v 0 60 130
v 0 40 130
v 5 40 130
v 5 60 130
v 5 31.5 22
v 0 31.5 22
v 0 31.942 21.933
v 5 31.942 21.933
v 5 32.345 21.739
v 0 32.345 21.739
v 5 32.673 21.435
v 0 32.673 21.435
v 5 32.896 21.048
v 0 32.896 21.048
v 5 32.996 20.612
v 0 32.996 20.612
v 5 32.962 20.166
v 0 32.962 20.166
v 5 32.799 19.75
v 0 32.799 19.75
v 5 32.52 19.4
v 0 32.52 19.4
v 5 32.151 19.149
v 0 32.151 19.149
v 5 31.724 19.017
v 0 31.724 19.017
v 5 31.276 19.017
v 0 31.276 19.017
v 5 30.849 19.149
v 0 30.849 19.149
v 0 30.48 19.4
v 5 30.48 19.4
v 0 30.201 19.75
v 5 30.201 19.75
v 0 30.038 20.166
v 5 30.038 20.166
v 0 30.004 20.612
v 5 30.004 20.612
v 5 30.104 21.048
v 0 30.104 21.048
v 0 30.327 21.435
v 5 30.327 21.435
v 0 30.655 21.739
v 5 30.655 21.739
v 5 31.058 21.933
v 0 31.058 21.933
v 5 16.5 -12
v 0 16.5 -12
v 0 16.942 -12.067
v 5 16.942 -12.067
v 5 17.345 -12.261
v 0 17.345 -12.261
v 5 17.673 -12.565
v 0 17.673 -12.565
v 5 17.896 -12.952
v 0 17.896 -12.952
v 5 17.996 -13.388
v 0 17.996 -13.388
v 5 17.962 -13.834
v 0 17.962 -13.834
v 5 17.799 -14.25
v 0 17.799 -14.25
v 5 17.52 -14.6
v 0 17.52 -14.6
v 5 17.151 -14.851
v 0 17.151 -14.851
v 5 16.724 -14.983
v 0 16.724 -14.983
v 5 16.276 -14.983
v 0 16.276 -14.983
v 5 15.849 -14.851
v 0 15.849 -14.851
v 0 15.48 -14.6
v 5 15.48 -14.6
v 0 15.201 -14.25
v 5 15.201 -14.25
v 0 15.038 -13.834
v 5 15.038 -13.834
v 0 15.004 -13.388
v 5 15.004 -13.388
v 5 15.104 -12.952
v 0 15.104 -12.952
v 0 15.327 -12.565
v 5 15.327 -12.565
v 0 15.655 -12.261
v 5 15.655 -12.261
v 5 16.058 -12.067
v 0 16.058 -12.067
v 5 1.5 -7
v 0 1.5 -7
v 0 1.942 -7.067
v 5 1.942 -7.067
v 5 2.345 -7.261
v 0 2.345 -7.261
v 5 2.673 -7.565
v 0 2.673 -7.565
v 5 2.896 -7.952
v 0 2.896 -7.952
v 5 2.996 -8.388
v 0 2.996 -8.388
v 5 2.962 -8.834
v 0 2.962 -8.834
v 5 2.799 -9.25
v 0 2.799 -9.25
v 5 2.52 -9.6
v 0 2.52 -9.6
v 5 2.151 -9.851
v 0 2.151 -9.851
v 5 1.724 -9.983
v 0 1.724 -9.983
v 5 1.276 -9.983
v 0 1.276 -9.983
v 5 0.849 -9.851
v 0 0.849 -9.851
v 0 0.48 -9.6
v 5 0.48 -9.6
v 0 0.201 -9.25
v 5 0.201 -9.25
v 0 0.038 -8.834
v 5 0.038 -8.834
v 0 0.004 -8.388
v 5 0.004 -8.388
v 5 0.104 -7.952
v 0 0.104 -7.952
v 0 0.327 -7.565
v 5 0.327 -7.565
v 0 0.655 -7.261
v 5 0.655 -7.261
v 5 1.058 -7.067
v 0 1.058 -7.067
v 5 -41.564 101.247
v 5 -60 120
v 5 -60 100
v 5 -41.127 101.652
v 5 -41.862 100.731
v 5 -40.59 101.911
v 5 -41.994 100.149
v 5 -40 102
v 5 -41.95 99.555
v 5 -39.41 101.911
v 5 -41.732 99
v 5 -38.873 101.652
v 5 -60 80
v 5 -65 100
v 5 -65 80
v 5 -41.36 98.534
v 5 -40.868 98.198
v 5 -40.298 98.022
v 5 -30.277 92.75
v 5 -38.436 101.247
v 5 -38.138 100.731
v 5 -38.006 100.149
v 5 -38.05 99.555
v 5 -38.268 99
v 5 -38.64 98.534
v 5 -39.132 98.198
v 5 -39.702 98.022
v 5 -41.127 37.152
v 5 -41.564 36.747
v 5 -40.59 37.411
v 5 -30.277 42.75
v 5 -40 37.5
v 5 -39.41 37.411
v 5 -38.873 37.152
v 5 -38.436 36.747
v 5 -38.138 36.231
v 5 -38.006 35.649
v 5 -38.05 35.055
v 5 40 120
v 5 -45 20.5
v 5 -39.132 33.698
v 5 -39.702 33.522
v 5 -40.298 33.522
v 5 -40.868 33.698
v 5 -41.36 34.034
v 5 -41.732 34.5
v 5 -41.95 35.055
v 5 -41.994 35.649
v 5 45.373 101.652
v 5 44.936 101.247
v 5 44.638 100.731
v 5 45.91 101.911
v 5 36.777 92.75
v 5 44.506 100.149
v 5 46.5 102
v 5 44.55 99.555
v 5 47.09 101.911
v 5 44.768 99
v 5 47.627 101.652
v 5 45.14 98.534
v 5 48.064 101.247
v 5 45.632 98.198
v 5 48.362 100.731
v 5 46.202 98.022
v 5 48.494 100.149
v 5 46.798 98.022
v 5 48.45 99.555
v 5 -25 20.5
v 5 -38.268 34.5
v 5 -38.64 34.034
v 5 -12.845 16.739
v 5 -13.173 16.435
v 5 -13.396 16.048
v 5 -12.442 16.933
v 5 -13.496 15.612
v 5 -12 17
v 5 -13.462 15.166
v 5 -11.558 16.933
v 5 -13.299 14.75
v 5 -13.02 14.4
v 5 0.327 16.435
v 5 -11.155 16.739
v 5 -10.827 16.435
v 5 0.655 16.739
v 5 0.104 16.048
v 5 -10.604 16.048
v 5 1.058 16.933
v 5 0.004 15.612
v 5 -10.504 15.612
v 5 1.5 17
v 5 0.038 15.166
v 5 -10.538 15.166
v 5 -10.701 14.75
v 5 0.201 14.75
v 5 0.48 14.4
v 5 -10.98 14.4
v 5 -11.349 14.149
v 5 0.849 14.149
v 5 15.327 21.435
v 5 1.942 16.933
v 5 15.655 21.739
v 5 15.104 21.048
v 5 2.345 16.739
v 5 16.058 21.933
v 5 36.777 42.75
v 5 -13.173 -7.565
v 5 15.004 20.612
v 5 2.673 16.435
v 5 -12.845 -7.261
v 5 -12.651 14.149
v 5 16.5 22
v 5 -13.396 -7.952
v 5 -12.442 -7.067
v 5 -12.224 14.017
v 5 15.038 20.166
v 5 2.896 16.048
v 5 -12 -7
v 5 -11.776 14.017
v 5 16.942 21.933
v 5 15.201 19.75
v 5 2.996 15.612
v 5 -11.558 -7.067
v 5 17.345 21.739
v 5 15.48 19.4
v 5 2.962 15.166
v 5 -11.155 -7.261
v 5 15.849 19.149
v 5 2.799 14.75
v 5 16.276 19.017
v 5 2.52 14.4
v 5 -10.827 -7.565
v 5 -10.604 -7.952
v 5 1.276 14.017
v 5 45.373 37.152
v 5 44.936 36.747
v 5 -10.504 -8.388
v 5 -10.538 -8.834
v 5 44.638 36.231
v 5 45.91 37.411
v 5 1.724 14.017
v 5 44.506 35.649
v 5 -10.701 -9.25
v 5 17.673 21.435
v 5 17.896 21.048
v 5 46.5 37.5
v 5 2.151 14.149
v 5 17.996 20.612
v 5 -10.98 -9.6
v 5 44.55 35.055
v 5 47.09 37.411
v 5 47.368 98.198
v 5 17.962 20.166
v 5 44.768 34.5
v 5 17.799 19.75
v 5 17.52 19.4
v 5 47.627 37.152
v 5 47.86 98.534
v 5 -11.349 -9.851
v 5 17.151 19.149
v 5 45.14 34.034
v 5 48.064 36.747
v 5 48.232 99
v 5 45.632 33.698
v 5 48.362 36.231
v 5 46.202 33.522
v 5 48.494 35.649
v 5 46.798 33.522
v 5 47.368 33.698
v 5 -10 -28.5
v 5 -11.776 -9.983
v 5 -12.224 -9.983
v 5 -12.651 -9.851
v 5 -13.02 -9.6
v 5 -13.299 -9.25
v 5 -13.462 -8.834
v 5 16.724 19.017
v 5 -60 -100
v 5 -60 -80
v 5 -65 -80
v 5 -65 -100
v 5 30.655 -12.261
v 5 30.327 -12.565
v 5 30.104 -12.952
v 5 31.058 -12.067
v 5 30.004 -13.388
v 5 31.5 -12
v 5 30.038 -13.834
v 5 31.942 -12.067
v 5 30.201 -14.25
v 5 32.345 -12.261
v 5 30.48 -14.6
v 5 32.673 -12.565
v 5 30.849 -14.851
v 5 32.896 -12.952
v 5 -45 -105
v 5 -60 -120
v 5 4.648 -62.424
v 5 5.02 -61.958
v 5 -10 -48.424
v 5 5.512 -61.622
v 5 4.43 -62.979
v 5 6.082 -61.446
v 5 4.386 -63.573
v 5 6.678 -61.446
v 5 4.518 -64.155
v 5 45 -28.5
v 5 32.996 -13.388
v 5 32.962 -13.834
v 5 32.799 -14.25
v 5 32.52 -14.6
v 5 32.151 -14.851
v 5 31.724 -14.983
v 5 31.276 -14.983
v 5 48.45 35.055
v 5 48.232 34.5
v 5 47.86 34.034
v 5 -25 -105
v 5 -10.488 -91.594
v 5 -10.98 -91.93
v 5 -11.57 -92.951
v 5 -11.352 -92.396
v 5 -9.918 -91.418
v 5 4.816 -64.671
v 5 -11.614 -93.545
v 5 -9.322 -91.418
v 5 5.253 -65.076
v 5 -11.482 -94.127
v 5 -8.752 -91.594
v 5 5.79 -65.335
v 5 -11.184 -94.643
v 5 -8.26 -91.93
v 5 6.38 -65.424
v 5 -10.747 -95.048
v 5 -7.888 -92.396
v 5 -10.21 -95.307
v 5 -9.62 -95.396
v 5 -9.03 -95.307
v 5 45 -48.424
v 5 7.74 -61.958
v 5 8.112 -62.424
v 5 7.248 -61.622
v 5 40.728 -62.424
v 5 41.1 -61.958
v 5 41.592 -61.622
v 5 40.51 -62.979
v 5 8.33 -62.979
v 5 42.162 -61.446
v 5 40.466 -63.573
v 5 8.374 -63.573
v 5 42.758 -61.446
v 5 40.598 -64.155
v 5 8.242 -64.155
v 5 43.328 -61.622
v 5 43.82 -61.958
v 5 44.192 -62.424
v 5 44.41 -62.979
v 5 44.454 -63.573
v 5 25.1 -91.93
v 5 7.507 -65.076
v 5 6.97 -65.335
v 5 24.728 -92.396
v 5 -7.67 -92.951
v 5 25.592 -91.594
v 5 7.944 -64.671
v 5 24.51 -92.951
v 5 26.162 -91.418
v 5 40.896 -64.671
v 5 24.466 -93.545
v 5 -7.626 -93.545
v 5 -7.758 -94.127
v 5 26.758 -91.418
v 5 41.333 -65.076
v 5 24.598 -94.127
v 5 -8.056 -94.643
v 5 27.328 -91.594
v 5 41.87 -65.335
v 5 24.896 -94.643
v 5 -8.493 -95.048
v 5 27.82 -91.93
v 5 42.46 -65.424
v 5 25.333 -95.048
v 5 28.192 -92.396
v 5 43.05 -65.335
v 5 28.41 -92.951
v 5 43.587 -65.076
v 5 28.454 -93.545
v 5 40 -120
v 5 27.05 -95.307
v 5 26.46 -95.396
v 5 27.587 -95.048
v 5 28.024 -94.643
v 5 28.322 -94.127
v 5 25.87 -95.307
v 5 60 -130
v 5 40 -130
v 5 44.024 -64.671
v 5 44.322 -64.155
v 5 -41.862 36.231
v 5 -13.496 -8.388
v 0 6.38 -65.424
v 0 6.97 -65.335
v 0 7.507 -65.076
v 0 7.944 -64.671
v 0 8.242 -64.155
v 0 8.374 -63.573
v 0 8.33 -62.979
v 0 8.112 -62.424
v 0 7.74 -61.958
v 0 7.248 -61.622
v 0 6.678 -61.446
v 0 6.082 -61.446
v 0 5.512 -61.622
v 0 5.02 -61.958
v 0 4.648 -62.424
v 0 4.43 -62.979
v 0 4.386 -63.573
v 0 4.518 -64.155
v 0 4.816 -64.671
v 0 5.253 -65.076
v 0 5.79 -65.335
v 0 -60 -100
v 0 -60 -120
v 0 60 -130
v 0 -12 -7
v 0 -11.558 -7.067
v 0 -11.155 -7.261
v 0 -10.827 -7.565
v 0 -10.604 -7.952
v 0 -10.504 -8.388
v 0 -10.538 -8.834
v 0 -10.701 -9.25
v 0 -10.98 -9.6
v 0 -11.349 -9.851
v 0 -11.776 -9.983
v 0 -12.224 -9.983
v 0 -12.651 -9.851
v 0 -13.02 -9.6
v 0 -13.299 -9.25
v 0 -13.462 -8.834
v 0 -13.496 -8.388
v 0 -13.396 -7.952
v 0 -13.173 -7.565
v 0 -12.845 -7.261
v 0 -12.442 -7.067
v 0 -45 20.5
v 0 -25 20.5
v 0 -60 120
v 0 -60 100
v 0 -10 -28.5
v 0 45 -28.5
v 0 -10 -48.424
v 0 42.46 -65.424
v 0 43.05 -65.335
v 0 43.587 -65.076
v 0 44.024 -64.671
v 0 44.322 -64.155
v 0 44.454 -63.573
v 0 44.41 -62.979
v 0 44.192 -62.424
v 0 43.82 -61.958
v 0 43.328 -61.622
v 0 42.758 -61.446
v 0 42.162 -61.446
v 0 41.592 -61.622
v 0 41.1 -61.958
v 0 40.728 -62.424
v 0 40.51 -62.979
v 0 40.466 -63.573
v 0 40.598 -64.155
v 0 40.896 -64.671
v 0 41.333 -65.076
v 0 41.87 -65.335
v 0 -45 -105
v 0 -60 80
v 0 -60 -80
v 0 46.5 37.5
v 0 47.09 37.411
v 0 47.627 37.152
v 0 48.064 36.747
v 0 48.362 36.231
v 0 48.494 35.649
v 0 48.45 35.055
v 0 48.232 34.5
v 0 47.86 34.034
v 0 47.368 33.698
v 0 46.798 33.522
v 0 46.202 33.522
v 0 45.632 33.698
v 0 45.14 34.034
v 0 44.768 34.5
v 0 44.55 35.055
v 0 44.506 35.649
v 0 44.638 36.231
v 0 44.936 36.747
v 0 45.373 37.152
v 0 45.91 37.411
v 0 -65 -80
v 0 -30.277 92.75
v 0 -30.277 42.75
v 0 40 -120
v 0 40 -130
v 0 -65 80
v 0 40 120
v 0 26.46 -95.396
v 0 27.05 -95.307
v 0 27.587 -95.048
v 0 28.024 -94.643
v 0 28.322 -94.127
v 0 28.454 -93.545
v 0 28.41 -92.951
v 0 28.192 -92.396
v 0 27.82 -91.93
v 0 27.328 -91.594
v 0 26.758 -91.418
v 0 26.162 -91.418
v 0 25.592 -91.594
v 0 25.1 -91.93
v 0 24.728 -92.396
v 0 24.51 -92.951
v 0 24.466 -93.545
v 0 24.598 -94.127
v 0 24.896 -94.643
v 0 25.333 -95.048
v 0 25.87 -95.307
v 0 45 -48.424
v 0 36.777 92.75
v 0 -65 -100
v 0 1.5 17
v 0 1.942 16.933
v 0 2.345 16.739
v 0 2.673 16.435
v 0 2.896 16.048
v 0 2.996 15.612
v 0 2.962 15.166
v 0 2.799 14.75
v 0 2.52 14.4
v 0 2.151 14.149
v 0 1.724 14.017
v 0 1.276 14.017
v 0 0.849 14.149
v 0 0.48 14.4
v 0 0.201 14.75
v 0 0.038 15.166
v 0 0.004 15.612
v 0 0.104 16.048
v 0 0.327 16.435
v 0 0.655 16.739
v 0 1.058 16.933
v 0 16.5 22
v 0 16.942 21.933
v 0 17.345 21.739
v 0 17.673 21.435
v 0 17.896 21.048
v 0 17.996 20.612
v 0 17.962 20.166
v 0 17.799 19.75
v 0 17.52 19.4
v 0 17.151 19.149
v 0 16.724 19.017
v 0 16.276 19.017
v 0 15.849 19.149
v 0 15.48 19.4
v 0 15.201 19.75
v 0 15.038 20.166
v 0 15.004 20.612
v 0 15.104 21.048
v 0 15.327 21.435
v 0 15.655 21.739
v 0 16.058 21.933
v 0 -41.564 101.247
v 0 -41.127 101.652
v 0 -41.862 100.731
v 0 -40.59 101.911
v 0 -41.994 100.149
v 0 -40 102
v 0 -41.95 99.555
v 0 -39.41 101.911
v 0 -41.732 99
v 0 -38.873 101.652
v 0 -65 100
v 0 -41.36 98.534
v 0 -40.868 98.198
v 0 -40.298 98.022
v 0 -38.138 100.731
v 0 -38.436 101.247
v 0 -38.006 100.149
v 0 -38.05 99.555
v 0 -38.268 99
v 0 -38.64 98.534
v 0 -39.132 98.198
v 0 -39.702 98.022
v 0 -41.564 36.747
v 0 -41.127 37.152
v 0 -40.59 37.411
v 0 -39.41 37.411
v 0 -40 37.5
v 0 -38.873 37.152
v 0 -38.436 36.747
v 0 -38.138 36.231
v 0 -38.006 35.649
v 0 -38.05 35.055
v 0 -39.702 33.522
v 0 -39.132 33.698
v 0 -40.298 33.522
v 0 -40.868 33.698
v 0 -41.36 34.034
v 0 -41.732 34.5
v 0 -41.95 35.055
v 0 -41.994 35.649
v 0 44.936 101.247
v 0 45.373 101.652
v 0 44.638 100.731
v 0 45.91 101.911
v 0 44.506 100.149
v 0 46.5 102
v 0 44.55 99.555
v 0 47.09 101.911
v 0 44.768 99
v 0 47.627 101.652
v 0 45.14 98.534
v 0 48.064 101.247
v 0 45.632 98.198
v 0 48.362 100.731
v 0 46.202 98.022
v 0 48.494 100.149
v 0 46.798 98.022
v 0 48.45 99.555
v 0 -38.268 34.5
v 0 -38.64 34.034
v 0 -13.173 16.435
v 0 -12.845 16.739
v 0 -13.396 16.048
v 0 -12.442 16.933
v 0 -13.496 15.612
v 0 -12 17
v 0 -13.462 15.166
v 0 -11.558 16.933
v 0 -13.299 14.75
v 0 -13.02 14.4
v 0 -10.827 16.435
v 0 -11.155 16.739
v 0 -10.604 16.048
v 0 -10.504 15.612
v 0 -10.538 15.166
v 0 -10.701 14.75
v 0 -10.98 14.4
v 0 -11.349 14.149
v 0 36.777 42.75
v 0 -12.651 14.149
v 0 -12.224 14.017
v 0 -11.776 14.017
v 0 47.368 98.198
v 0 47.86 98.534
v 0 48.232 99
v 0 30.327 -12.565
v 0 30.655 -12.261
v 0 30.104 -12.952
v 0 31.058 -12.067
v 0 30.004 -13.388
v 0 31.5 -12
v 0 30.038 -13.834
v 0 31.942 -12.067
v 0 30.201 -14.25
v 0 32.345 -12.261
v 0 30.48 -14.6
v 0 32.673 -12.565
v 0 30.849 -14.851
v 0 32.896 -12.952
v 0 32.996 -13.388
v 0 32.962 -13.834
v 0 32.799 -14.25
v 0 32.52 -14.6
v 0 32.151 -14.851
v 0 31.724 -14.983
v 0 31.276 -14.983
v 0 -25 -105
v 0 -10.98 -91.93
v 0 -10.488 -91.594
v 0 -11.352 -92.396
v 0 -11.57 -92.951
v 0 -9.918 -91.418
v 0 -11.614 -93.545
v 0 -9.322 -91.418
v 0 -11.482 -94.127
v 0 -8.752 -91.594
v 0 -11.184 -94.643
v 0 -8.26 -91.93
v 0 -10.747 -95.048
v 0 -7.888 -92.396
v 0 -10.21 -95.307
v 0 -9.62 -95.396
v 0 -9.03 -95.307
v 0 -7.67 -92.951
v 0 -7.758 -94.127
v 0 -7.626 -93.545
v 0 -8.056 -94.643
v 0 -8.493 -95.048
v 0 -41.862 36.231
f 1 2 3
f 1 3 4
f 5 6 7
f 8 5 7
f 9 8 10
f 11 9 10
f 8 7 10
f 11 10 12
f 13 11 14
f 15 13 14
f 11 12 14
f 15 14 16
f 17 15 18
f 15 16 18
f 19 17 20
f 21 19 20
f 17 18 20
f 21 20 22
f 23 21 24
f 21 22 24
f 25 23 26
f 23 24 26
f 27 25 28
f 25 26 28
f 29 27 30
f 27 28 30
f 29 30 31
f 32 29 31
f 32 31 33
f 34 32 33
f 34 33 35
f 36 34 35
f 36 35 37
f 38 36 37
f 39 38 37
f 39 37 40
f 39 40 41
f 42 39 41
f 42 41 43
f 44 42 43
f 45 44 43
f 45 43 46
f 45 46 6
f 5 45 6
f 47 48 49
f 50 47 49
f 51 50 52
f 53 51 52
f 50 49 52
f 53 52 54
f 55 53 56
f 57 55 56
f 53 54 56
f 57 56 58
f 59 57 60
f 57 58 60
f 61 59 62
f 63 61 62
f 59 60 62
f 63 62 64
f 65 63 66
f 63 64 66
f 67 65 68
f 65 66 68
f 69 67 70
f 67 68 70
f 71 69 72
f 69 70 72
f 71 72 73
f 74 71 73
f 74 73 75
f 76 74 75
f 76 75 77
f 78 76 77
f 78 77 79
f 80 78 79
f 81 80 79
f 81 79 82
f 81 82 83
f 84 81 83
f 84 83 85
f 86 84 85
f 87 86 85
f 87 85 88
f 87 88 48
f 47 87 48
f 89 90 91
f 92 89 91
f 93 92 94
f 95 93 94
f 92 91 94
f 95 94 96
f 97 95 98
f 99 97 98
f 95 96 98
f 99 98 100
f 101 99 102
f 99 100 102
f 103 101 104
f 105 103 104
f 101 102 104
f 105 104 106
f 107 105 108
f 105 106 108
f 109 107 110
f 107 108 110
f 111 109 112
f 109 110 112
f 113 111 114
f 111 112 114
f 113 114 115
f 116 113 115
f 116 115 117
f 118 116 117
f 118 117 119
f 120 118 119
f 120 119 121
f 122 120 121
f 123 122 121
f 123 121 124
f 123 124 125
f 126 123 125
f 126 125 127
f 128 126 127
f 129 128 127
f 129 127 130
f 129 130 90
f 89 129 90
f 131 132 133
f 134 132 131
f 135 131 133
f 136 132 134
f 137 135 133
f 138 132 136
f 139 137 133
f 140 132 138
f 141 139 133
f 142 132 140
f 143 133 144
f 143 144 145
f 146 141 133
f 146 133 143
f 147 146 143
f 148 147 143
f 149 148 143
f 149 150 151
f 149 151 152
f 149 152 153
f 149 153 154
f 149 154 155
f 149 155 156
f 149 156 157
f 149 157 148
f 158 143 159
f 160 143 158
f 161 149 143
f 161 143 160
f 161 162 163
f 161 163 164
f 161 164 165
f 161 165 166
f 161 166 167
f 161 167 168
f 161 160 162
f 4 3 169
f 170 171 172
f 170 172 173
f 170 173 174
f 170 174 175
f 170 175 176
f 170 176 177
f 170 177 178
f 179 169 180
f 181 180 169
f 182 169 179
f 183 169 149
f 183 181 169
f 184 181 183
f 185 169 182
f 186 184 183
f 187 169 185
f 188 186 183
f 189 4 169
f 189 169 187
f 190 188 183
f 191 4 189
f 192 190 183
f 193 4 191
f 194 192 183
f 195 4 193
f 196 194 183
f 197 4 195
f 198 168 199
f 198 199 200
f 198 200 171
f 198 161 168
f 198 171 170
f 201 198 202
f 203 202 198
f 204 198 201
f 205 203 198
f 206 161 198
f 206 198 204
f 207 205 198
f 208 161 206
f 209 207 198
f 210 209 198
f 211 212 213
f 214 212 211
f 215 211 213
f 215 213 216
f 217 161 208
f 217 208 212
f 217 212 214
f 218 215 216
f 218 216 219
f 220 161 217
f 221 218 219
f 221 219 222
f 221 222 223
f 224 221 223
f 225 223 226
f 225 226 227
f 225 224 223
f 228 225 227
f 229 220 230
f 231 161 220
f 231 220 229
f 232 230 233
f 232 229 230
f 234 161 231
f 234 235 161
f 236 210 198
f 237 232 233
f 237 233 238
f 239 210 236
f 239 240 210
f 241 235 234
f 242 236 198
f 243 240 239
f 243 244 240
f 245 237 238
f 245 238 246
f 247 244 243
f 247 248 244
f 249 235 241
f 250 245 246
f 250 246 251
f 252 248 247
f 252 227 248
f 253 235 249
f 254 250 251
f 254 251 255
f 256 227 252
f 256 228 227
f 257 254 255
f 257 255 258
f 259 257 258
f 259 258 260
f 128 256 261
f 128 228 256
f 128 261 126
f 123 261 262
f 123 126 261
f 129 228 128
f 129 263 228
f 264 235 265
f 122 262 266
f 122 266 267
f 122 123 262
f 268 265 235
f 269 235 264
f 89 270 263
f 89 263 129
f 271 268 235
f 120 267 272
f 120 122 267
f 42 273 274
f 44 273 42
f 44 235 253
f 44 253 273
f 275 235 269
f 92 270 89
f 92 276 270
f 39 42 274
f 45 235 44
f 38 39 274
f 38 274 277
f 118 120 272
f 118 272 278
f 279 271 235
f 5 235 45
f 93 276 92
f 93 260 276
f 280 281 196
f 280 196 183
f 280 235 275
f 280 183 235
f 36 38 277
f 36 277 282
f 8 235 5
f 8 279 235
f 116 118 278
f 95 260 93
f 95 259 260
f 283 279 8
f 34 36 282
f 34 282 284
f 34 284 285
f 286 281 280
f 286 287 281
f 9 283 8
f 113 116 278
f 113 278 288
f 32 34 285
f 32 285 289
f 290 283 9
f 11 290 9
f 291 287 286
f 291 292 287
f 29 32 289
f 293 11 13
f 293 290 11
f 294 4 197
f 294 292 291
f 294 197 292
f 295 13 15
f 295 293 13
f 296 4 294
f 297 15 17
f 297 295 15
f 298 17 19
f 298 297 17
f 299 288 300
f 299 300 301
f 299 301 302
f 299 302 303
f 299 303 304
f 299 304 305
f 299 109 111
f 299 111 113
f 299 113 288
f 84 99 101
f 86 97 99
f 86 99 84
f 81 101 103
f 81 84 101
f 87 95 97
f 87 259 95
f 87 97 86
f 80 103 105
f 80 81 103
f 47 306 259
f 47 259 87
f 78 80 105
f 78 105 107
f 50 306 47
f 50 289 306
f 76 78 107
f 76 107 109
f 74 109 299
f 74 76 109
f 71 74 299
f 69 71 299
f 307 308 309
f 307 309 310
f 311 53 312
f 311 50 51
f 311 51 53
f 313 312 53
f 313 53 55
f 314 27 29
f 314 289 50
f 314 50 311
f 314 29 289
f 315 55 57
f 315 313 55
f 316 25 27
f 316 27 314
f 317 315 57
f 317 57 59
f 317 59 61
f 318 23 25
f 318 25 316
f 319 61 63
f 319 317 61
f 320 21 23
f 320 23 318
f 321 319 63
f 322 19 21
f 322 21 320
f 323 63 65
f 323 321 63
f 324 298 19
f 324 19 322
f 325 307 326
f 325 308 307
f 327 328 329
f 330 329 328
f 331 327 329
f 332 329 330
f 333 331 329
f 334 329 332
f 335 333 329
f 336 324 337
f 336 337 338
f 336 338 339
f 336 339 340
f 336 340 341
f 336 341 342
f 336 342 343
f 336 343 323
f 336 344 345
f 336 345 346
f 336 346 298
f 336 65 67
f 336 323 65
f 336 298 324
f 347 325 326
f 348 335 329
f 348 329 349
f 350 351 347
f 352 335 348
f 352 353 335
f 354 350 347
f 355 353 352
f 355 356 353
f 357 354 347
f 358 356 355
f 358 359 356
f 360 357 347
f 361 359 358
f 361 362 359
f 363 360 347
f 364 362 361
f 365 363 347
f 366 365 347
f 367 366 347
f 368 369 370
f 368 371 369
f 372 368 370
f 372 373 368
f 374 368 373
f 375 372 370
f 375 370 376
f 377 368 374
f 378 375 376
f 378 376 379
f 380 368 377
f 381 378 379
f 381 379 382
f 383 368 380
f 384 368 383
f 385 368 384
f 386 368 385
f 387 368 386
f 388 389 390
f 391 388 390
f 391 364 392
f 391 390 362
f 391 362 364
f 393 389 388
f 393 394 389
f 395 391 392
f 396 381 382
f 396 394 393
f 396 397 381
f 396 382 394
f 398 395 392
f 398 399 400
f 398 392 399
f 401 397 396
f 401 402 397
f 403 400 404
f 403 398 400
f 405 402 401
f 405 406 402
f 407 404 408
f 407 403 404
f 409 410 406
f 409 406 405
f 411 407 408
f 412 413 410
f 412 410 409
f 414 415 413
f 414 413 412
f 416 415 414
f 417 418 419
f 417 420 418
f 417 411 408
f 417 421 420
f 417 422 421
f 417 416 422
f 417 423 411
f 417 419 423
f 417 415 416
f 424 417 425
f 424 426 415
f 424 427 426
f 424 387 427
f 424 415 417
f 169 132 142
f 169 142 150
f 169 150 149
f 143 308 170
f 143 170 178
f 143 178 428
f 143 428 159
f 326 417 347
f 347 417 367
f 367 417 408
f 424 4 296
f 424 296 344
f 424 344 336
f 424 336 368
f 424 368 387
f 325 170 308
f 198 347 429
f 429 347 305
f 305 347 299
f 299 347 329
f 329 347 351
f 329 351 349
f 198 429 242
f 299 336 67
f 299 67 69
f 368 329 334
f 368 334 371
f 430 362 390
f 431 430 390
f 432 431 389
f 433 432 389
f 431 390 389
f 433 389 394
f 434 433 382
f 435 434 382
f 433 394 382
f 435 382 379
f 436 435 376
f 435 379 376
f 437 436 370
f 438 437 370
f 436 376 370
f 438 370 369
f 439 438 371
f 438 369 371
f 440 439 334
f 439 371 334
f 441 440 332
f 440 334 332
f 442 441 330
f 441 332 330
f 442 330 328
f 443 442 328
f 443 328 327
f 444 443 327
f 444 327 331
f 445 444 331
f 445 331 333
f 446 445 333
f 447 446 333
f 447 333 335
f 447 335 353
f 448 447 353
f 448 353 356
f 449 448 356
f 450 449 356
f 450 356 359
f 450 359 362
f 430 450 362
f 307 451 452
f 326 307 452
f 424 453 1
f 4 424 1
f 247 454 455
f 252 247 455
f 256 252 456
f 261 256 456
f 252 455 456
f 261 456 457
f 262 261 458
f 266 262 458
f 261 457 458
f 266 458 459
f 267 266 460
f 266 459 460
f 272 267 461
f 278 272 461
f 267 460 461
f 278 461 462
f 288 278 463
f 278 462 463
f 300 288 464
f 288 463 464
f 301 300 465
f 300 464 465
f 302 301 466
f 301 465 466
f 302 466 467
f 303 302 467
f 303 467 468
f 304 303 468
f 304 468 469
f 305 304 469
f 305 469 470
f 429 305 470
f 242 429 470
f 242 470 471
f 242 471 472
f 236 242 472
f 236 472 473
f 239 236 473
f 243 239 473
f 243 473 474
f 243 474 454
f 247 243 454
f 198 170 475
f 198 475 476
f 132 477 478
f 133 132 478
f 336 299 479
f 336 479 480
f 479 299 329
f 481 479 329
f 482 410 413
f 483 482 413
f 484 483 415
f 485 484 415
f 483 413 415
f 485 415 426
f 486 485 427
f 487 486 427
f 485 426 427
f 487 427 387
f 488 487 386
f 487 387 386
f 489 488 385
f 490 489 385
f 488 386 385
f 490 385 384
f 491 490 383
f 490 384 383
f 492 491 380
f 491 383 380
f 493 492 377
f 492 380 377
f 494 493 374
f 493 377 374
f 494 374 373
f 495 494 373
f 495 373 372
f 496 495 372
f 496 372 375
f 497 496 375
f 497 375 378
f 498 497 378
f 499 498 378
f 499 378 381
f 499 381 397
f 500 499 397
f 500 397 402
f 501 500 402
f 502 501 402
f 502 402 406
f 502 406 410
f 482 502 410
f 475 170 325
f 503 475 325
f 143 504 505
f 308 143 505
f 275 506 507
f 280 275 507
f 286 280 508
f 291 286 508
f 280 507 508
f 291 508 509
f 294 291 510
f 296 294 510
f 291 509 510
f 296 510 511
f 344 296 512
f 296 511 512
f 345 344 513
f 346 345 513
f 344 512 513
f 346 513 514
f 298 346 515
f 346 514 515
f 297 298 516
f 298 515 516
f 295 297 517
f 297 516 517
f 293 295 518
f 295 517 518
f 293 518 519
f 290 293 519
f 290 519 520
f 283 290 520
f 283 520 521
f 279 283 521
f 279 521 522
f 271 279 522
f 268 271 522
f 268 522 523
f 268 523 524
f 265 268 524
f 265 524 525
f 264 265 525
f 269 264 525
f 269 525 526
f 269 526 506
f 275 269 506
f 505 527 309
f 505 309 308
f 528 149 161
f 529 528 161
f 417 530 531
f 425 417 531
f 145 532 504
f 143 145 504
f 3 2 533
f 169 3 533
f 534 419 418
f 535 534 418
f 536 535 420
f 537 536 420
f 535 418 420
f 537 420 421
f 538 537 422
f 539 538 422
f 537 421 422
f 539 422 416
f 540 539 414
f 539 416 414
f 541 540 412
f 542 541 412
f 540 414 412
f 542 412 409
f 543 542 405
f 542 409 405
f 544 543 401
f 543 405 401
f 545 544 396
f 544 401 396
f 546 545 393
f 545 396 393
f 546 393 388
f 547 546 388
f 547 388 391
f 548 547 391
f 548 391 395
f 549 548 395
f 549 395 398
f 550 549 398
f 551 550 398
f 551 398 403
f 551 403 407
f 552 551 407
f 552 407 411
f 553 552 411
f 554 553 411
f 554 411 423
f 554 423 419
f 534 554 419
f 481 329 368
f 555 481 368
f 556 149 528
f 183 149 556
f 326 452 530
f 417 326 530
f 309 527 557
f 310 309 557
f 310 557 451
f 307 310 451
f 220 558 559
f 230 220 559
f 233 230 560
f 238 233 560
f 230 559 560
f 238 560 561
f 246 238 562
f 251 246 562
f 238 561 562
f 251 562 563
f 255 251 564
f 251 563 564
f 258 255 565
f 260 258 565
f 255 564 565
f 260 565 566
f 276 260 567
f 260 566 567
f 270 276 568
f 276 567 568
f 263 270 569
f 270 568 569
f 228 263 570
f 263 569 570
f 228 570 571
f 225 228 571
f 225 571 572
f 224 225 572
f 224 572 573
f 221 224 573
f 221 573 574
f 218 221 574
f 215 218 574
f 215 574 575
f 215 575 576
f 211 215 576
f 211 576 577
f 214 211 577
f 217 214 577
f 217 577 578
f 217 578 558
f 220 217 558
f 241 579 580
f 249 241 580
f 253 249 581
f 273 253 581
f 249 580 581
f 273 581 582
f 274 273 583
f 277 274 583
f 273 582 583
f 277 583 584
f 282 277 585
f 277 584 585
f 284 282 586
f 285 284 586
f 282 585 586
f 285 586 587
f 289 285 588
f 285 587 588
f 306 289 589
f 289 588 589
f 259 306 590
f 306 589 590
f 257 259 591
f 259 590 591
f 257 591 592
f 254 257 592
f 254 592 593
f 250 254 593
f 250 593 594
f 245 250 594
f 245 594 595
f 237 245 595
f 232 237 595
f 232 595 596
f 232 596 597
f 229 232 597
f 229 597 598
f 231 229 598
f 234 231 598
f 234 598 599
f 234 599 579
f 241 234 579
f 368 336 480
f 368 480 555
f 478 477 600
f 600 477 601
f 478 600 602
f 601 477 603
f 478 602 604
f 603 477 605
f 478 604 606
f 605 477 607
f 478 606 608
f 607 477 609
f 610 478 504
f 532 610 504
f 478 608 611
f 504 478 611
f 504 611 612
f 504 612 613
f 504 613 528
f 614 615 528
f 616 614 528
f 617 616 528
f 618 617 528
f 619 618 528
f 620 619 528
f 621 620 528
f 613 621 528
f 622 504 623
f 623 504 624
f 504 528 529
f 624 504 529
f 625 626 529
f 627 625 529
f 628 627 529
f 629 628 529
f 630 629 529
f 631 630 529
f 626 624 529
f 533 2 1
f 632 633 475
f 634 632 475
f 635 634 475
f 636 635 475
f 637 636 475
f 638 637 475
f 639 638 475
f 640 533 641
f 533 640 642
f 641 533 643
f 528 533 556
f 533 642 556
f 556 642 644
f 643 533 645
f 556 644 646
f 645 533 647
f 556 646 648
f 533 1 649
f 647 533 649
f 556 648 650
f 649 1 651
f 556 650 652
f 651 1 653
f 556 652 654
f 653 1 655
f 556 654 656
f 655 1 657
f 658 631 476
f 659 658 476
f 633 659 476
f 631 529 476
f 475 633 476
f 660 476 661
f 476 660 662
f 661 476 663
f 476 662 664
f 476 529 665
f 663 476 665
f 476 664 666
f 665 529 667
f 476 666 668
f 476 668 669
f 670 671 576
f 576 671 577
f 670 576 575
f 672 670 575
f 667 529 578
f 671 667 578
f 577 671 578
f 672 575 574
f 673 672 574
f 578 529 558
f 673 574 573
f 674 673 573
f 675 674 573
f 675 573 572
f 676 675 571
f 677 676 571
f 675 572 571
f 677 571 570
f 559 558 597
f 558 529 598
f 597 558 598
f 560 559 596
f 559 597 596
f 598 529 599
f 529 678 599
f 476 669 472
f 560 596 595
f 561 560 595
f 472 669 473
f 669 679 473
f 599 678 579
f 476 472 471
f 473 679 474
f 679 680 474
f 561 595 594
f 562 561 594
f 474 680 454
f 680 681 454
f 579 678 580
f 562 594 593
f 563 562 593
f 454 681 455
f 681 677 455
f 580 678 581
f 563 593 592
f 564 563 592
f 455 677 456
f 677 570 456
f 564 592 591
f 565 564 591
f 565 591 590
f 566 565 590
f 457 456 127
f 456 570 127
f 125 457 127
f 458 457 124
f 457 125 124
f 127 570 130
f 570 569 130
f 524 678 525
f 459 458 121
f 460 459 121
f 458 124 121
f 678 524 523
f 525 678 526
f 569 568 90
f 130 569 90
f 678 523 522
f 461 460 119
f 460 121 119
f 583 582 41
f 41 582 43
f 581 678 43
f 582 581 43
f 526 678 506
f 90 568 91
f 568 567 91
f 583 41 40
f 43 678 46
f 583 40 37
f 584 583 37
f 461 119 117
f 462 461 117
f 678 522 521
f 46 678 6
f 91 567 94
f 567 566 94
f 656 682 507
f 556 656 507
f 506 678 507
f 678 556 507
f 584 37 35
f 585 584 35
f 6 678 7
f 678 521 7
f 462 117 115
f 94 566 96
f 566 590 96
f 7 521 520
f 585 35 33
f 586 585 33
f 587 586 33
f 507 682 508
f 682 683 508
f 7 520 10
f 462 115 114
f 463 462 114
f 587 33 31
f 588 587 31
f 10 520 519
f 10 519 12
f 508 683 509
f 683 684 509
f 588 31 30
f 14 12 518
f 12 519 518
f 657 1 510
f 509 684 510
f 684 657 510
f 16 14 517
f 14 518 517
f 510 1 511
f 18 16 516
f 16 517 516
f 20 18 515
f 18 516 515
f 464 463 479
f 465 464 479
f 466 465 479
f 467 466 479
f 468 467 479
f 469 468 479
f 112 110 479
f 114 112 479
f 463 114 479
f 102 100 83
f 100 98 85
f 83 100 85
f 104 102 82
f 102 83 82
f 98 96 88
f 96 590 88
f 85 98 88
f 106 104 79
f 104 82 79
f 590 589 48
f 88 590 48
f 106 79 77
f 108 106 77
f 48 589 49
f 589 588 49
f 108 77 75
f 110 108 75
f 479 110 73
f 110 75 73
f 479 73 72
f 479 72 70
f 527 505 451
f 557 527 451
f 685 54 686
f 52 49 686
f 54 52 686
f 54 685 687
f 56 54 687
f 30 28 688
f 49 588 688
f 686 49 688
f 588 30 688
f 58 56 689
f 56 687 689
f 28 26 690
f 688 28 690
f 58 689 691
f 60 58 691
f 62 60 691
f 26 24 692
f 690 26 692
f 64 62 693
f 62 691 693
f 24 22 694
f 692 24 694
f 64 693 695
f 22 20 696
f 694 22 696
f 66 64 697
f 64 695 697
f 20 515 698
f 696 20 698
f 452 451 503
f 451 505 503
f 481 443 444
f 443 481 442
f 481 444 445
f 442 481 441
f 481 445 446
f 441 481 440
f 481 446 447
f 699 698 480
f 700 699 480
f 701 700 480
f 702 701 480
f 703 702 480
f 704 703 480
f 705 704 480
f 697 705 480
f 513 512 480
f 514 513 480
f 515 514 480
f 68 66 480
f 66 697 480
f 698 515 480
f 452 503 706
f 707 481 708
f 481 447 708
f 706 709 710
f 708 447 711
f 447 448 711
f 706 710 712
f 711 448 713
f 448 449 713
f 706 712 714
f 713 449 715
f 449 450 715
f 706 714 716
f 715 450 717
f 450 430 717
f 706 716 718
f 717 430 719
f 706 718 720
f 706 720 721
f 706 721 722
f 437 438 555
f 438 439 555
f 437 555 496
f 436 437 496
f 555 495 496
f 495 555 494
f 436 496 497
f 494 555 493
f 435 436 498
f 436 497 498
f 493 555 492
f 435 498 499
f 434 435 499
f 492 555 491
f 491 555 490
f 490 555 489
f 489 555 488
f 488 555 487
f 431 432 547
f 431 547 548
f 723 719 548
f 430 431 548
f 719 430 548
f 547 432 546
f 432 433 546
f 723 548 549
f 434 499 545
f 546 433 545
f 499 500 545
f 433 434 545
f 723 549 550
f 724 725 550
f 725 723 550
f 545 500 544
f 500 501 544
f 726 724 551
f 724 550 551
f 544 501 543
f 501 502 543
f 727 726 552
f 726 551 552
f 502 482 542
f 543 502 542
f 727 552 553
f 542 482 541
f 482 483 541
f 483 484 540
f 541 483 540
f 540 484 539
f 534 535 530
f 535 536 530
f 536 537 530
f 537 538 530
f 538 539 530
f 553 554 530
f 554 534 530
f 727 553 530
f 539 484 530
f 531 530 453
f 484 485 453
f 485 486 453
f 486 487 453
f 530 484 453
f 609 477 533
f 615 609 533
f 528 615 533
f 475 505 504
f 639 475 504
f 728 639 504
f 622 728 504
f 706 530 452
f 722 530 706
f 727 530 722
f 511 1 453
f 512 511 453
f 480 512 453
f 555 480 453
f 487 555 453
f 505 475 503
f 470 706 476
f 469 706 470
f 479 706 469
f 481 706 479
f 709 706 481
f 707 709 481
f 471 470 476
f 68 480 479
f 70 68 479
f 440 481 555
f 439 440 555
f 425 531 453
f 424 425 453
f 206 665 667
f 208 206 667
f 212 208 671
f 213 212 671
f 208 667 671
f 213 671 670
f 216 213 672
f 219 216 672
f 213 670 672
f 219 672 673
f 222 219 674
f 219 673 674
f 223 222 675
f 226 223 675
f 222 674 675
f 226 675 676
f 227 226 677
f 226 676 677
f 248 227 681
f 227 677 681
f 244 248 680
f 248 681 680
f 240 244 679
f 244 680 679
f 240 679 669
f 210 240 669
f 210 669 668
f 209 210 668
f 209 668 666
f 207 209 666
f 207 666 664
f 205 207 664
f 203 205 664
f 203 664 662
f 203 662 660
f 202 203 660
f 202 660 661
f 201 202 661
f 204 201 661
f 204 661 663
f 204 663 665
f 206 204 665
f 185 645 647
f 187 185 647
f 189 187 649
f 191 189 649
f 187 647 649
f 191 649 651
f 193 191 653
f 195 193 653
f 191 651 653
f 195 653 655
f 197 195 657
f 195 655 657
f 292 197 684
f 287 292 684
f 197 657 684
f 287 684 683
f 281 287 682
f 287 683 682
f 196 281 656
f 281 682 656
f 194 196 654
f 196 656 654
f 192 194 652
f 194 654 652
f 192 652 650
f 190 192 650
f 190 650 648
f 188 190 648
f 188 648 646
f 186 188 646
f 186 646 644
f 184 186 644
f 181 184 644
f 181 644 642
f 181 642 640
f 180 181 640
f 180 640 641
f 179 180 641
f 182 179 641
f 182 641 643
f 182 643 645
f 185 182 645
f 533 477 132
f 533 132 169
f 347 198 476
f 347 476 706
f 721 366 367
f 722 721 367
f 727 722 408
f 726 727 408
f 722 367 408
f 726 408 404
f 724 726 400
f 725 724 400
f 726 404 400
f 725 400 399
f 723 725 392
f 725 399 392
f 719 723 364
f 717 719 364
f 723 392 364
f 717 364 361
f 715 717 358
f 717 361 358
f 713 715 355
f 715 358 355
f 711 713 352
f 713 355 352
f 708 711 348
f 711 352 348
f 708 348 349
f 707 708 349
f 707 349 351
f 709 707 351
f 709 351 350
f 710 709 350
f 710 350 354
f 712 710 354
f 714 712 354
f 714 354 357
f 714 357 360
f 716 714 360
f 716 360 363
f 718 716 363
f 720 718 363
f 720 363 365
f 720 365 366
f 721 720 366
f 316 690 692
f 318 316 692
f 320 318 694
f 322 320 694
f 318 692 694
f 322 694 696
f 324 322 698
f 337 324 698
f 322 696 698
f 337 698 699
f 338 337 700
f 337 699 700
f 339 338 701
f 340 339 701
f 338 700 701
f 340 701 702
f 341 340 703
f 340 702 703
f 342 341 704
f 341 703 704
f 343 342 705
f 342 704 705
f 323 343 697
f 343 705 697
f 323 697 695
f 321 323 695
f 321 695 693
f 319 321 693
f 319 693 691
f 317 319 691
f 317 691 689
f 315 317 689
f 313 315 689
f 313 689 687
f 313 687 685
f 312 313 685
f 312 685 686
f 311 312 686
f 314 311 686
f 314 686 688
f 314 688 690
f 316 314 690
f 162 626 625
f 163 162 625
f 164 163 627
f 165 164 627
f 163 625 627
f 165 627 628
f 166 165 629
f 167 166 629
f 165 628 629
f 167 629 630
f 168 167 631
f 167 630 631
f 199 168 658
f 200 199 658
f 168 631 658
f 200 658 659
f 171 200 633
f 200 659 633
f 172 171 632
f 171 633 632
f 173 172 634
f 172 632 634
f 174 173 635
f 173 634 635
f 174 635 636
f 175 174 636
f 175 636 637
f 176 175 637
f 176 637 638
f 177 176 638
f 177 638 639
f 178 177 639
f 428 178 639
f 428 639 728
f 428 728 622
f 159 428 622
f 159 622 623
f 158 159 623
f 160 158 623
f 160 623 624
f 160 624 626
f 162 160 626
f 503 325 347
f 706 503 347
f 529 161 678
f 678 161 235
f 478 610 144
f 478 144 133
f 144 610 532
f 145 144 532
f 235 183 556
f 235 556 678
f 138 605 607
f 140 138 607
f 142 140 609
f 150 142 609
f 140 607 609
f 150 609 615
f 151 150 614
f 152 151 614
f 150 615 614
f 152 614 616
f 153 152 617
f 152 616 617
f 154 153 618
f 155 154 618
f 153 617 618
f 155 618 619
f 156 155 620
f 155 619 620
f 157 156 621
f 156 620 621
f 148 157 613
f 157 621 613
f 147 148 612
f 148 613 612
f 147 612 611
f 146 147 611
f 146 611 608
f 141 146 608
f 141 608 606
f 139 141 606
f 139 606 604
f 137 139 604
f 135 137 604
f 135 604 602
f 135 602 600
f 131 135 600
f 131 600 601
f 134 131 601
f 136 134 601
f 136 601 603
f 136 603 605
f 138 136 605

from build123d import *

# Parameters (mm, degrees)
SKIZZE2_W                       = 240
SKIZZE2_H                       = 120
SKIZZE2_W_2                     = 10
SKIZZE2_H_2                     = 20
SKIZZE2_W_3                     = 20
SKIZZE2_H_3                     = 5
AUFSATZ_LINEAR_AUSTRAGEN1_DEPTH = 5
SKIZZE3_R                       = 2
SKIZZE3_R_2                     = 1.5
SCHNITT_LINEAR_AUSTRAGEN1_DEPTH = 146.430395722
SKIZZE4_R                       = 2
SCHNITT_LINEAR_AUSTRAGEN2_DEPTH = 146.430395722
SKIZZE6_W                       = 50
SKIZZE6_H                       = 67.054263566
SKIZZE6_W_2                     = 125.5
SKIZZE6_H_2                     = 20
SKIZZE6_W_3                     = 19.924
SKIZZE6_H_3                     = 55
SCHNITT_LINEAR_AUSTRAGEN3_DEPTH = 146.430395722


with BuildPart() as part:
    # Skizze2 → Aufsatz-Linear austragen1 (new body)
    with BuildSketch(Plane(origin=(0, 0, 0), x_dir=(0, 0, -1), z_dir=(1, 0, 0))):
        Rectangle(SKIZZE2_W, SKIZZE2_H)
        with Locations((-125, 50)):
            Rectangle(SKIZZE2_W_2, SKIZZE2_H_2)
        with Locations((125, 50)):
            Rectangle(SKIZZE2_W_2, SKIZZE2_H_2)
        with Locations((-90, -62.5)):
            Rectangle(SKIZZE2_W_3, SKIZZE2_H_3)
        with Locations((90, -62.5)):
            Rectangle(SKIZZE2_W_3, SKIZZE2_H_3)
    extrude(amount=AUFSATZ_LINEAR_AUSTRAGEN1_DEPTH)

    # Skizze3 → Schnitt-Linear austragen1 (cut, through all)
    with BuildSketch(Plane.ZY):
        with Locations((35.5, 46.5)):
            Circle(SKIZZE3_R)
        with Locations((100, 46.5)):
            Circle(SKIZZE3_R)
        with Locations((100, -40)):
            Circle(SKIZZE3_R)
        with Locations((35.5, -40)):
            Circle(SKIZZE3_R)
        with Locations((20.5, 31.5)):
            Circle(SKIZZE3_R_2)
        with Locations((-13.5, 31.5)):
            Circle(SKIZZE3_R_2)
        with Locations((-13.5, 16.5)):
            Circle(SKIZZE3_R_2)
        with Locations((20.5, 16.5)):
            Circle(SKIZZE3_R_2)
        with Locations((15.5, 1.5)):
            Circle(SKIZZE3_R_2)
        with Locations((15.5, -12)):
            Circle(SKIZZE3_R_2)
        with Locations((-8.5, 1.5)):
            Circle(SKIZZE3_R_2)
        with Locations((-8.5, -12)):
            Circle(SKIZZE3_R_2)
    extrude(amount=-SCHNITT_LINEAR_AUSTRAGEN1_DEPTH, mode=Mode.SUBTRACT)

    # Skizze4 → Schnitt-Linear austragen2 (cut, through all)
    with BuildSketch(Plane(origin=(5, 0, 0), x_dir=(0, 0, -1), z_dir=(1, 0, 0))):
        with Locations((63.424, 42.46)):
            Circle(SKIZZE4_R)
        with Locations((93.396, 26.46)):
            Circle(SKIZZE4_R)
        with Locations((63.424, 6.38)):
            Circle(SKIZZE4_R)
        with Locations((93.396, -9.62)):
            Circle(SKIZZE4_R)
    extrude(amount=-SCHNITT_LINEAR_AUSTRAGEN2_DEPTH, mode=Mode.SUBTRACT)

    # Skizze6 → Schnitt-Linear austragen3 (cut, through all)
    with BuildSketch(Plane(origin=(5, 0, 0), x_dir=(0, 0, -1), z_dir=(1, 0, 0))):
        with Locations((-67.75, 3.25)):
            Rectangle(SKIZZE6_W, SKIZZE6_H)
        with Locations((42.25, -35)):
            Rectangle(SKIZZE6_W_2, SKIZZE6_H_2)
        with Locations((38.462, 17.5)):
            Rectangle(SKIZZE6_W_3, SKIZZE6_H_3)
    extrude(amount=-SCHNITT_LINEAR_AUSTRAGEN3_DEPTH, mode=Mode.SUBTRACT)


solid = part.part
